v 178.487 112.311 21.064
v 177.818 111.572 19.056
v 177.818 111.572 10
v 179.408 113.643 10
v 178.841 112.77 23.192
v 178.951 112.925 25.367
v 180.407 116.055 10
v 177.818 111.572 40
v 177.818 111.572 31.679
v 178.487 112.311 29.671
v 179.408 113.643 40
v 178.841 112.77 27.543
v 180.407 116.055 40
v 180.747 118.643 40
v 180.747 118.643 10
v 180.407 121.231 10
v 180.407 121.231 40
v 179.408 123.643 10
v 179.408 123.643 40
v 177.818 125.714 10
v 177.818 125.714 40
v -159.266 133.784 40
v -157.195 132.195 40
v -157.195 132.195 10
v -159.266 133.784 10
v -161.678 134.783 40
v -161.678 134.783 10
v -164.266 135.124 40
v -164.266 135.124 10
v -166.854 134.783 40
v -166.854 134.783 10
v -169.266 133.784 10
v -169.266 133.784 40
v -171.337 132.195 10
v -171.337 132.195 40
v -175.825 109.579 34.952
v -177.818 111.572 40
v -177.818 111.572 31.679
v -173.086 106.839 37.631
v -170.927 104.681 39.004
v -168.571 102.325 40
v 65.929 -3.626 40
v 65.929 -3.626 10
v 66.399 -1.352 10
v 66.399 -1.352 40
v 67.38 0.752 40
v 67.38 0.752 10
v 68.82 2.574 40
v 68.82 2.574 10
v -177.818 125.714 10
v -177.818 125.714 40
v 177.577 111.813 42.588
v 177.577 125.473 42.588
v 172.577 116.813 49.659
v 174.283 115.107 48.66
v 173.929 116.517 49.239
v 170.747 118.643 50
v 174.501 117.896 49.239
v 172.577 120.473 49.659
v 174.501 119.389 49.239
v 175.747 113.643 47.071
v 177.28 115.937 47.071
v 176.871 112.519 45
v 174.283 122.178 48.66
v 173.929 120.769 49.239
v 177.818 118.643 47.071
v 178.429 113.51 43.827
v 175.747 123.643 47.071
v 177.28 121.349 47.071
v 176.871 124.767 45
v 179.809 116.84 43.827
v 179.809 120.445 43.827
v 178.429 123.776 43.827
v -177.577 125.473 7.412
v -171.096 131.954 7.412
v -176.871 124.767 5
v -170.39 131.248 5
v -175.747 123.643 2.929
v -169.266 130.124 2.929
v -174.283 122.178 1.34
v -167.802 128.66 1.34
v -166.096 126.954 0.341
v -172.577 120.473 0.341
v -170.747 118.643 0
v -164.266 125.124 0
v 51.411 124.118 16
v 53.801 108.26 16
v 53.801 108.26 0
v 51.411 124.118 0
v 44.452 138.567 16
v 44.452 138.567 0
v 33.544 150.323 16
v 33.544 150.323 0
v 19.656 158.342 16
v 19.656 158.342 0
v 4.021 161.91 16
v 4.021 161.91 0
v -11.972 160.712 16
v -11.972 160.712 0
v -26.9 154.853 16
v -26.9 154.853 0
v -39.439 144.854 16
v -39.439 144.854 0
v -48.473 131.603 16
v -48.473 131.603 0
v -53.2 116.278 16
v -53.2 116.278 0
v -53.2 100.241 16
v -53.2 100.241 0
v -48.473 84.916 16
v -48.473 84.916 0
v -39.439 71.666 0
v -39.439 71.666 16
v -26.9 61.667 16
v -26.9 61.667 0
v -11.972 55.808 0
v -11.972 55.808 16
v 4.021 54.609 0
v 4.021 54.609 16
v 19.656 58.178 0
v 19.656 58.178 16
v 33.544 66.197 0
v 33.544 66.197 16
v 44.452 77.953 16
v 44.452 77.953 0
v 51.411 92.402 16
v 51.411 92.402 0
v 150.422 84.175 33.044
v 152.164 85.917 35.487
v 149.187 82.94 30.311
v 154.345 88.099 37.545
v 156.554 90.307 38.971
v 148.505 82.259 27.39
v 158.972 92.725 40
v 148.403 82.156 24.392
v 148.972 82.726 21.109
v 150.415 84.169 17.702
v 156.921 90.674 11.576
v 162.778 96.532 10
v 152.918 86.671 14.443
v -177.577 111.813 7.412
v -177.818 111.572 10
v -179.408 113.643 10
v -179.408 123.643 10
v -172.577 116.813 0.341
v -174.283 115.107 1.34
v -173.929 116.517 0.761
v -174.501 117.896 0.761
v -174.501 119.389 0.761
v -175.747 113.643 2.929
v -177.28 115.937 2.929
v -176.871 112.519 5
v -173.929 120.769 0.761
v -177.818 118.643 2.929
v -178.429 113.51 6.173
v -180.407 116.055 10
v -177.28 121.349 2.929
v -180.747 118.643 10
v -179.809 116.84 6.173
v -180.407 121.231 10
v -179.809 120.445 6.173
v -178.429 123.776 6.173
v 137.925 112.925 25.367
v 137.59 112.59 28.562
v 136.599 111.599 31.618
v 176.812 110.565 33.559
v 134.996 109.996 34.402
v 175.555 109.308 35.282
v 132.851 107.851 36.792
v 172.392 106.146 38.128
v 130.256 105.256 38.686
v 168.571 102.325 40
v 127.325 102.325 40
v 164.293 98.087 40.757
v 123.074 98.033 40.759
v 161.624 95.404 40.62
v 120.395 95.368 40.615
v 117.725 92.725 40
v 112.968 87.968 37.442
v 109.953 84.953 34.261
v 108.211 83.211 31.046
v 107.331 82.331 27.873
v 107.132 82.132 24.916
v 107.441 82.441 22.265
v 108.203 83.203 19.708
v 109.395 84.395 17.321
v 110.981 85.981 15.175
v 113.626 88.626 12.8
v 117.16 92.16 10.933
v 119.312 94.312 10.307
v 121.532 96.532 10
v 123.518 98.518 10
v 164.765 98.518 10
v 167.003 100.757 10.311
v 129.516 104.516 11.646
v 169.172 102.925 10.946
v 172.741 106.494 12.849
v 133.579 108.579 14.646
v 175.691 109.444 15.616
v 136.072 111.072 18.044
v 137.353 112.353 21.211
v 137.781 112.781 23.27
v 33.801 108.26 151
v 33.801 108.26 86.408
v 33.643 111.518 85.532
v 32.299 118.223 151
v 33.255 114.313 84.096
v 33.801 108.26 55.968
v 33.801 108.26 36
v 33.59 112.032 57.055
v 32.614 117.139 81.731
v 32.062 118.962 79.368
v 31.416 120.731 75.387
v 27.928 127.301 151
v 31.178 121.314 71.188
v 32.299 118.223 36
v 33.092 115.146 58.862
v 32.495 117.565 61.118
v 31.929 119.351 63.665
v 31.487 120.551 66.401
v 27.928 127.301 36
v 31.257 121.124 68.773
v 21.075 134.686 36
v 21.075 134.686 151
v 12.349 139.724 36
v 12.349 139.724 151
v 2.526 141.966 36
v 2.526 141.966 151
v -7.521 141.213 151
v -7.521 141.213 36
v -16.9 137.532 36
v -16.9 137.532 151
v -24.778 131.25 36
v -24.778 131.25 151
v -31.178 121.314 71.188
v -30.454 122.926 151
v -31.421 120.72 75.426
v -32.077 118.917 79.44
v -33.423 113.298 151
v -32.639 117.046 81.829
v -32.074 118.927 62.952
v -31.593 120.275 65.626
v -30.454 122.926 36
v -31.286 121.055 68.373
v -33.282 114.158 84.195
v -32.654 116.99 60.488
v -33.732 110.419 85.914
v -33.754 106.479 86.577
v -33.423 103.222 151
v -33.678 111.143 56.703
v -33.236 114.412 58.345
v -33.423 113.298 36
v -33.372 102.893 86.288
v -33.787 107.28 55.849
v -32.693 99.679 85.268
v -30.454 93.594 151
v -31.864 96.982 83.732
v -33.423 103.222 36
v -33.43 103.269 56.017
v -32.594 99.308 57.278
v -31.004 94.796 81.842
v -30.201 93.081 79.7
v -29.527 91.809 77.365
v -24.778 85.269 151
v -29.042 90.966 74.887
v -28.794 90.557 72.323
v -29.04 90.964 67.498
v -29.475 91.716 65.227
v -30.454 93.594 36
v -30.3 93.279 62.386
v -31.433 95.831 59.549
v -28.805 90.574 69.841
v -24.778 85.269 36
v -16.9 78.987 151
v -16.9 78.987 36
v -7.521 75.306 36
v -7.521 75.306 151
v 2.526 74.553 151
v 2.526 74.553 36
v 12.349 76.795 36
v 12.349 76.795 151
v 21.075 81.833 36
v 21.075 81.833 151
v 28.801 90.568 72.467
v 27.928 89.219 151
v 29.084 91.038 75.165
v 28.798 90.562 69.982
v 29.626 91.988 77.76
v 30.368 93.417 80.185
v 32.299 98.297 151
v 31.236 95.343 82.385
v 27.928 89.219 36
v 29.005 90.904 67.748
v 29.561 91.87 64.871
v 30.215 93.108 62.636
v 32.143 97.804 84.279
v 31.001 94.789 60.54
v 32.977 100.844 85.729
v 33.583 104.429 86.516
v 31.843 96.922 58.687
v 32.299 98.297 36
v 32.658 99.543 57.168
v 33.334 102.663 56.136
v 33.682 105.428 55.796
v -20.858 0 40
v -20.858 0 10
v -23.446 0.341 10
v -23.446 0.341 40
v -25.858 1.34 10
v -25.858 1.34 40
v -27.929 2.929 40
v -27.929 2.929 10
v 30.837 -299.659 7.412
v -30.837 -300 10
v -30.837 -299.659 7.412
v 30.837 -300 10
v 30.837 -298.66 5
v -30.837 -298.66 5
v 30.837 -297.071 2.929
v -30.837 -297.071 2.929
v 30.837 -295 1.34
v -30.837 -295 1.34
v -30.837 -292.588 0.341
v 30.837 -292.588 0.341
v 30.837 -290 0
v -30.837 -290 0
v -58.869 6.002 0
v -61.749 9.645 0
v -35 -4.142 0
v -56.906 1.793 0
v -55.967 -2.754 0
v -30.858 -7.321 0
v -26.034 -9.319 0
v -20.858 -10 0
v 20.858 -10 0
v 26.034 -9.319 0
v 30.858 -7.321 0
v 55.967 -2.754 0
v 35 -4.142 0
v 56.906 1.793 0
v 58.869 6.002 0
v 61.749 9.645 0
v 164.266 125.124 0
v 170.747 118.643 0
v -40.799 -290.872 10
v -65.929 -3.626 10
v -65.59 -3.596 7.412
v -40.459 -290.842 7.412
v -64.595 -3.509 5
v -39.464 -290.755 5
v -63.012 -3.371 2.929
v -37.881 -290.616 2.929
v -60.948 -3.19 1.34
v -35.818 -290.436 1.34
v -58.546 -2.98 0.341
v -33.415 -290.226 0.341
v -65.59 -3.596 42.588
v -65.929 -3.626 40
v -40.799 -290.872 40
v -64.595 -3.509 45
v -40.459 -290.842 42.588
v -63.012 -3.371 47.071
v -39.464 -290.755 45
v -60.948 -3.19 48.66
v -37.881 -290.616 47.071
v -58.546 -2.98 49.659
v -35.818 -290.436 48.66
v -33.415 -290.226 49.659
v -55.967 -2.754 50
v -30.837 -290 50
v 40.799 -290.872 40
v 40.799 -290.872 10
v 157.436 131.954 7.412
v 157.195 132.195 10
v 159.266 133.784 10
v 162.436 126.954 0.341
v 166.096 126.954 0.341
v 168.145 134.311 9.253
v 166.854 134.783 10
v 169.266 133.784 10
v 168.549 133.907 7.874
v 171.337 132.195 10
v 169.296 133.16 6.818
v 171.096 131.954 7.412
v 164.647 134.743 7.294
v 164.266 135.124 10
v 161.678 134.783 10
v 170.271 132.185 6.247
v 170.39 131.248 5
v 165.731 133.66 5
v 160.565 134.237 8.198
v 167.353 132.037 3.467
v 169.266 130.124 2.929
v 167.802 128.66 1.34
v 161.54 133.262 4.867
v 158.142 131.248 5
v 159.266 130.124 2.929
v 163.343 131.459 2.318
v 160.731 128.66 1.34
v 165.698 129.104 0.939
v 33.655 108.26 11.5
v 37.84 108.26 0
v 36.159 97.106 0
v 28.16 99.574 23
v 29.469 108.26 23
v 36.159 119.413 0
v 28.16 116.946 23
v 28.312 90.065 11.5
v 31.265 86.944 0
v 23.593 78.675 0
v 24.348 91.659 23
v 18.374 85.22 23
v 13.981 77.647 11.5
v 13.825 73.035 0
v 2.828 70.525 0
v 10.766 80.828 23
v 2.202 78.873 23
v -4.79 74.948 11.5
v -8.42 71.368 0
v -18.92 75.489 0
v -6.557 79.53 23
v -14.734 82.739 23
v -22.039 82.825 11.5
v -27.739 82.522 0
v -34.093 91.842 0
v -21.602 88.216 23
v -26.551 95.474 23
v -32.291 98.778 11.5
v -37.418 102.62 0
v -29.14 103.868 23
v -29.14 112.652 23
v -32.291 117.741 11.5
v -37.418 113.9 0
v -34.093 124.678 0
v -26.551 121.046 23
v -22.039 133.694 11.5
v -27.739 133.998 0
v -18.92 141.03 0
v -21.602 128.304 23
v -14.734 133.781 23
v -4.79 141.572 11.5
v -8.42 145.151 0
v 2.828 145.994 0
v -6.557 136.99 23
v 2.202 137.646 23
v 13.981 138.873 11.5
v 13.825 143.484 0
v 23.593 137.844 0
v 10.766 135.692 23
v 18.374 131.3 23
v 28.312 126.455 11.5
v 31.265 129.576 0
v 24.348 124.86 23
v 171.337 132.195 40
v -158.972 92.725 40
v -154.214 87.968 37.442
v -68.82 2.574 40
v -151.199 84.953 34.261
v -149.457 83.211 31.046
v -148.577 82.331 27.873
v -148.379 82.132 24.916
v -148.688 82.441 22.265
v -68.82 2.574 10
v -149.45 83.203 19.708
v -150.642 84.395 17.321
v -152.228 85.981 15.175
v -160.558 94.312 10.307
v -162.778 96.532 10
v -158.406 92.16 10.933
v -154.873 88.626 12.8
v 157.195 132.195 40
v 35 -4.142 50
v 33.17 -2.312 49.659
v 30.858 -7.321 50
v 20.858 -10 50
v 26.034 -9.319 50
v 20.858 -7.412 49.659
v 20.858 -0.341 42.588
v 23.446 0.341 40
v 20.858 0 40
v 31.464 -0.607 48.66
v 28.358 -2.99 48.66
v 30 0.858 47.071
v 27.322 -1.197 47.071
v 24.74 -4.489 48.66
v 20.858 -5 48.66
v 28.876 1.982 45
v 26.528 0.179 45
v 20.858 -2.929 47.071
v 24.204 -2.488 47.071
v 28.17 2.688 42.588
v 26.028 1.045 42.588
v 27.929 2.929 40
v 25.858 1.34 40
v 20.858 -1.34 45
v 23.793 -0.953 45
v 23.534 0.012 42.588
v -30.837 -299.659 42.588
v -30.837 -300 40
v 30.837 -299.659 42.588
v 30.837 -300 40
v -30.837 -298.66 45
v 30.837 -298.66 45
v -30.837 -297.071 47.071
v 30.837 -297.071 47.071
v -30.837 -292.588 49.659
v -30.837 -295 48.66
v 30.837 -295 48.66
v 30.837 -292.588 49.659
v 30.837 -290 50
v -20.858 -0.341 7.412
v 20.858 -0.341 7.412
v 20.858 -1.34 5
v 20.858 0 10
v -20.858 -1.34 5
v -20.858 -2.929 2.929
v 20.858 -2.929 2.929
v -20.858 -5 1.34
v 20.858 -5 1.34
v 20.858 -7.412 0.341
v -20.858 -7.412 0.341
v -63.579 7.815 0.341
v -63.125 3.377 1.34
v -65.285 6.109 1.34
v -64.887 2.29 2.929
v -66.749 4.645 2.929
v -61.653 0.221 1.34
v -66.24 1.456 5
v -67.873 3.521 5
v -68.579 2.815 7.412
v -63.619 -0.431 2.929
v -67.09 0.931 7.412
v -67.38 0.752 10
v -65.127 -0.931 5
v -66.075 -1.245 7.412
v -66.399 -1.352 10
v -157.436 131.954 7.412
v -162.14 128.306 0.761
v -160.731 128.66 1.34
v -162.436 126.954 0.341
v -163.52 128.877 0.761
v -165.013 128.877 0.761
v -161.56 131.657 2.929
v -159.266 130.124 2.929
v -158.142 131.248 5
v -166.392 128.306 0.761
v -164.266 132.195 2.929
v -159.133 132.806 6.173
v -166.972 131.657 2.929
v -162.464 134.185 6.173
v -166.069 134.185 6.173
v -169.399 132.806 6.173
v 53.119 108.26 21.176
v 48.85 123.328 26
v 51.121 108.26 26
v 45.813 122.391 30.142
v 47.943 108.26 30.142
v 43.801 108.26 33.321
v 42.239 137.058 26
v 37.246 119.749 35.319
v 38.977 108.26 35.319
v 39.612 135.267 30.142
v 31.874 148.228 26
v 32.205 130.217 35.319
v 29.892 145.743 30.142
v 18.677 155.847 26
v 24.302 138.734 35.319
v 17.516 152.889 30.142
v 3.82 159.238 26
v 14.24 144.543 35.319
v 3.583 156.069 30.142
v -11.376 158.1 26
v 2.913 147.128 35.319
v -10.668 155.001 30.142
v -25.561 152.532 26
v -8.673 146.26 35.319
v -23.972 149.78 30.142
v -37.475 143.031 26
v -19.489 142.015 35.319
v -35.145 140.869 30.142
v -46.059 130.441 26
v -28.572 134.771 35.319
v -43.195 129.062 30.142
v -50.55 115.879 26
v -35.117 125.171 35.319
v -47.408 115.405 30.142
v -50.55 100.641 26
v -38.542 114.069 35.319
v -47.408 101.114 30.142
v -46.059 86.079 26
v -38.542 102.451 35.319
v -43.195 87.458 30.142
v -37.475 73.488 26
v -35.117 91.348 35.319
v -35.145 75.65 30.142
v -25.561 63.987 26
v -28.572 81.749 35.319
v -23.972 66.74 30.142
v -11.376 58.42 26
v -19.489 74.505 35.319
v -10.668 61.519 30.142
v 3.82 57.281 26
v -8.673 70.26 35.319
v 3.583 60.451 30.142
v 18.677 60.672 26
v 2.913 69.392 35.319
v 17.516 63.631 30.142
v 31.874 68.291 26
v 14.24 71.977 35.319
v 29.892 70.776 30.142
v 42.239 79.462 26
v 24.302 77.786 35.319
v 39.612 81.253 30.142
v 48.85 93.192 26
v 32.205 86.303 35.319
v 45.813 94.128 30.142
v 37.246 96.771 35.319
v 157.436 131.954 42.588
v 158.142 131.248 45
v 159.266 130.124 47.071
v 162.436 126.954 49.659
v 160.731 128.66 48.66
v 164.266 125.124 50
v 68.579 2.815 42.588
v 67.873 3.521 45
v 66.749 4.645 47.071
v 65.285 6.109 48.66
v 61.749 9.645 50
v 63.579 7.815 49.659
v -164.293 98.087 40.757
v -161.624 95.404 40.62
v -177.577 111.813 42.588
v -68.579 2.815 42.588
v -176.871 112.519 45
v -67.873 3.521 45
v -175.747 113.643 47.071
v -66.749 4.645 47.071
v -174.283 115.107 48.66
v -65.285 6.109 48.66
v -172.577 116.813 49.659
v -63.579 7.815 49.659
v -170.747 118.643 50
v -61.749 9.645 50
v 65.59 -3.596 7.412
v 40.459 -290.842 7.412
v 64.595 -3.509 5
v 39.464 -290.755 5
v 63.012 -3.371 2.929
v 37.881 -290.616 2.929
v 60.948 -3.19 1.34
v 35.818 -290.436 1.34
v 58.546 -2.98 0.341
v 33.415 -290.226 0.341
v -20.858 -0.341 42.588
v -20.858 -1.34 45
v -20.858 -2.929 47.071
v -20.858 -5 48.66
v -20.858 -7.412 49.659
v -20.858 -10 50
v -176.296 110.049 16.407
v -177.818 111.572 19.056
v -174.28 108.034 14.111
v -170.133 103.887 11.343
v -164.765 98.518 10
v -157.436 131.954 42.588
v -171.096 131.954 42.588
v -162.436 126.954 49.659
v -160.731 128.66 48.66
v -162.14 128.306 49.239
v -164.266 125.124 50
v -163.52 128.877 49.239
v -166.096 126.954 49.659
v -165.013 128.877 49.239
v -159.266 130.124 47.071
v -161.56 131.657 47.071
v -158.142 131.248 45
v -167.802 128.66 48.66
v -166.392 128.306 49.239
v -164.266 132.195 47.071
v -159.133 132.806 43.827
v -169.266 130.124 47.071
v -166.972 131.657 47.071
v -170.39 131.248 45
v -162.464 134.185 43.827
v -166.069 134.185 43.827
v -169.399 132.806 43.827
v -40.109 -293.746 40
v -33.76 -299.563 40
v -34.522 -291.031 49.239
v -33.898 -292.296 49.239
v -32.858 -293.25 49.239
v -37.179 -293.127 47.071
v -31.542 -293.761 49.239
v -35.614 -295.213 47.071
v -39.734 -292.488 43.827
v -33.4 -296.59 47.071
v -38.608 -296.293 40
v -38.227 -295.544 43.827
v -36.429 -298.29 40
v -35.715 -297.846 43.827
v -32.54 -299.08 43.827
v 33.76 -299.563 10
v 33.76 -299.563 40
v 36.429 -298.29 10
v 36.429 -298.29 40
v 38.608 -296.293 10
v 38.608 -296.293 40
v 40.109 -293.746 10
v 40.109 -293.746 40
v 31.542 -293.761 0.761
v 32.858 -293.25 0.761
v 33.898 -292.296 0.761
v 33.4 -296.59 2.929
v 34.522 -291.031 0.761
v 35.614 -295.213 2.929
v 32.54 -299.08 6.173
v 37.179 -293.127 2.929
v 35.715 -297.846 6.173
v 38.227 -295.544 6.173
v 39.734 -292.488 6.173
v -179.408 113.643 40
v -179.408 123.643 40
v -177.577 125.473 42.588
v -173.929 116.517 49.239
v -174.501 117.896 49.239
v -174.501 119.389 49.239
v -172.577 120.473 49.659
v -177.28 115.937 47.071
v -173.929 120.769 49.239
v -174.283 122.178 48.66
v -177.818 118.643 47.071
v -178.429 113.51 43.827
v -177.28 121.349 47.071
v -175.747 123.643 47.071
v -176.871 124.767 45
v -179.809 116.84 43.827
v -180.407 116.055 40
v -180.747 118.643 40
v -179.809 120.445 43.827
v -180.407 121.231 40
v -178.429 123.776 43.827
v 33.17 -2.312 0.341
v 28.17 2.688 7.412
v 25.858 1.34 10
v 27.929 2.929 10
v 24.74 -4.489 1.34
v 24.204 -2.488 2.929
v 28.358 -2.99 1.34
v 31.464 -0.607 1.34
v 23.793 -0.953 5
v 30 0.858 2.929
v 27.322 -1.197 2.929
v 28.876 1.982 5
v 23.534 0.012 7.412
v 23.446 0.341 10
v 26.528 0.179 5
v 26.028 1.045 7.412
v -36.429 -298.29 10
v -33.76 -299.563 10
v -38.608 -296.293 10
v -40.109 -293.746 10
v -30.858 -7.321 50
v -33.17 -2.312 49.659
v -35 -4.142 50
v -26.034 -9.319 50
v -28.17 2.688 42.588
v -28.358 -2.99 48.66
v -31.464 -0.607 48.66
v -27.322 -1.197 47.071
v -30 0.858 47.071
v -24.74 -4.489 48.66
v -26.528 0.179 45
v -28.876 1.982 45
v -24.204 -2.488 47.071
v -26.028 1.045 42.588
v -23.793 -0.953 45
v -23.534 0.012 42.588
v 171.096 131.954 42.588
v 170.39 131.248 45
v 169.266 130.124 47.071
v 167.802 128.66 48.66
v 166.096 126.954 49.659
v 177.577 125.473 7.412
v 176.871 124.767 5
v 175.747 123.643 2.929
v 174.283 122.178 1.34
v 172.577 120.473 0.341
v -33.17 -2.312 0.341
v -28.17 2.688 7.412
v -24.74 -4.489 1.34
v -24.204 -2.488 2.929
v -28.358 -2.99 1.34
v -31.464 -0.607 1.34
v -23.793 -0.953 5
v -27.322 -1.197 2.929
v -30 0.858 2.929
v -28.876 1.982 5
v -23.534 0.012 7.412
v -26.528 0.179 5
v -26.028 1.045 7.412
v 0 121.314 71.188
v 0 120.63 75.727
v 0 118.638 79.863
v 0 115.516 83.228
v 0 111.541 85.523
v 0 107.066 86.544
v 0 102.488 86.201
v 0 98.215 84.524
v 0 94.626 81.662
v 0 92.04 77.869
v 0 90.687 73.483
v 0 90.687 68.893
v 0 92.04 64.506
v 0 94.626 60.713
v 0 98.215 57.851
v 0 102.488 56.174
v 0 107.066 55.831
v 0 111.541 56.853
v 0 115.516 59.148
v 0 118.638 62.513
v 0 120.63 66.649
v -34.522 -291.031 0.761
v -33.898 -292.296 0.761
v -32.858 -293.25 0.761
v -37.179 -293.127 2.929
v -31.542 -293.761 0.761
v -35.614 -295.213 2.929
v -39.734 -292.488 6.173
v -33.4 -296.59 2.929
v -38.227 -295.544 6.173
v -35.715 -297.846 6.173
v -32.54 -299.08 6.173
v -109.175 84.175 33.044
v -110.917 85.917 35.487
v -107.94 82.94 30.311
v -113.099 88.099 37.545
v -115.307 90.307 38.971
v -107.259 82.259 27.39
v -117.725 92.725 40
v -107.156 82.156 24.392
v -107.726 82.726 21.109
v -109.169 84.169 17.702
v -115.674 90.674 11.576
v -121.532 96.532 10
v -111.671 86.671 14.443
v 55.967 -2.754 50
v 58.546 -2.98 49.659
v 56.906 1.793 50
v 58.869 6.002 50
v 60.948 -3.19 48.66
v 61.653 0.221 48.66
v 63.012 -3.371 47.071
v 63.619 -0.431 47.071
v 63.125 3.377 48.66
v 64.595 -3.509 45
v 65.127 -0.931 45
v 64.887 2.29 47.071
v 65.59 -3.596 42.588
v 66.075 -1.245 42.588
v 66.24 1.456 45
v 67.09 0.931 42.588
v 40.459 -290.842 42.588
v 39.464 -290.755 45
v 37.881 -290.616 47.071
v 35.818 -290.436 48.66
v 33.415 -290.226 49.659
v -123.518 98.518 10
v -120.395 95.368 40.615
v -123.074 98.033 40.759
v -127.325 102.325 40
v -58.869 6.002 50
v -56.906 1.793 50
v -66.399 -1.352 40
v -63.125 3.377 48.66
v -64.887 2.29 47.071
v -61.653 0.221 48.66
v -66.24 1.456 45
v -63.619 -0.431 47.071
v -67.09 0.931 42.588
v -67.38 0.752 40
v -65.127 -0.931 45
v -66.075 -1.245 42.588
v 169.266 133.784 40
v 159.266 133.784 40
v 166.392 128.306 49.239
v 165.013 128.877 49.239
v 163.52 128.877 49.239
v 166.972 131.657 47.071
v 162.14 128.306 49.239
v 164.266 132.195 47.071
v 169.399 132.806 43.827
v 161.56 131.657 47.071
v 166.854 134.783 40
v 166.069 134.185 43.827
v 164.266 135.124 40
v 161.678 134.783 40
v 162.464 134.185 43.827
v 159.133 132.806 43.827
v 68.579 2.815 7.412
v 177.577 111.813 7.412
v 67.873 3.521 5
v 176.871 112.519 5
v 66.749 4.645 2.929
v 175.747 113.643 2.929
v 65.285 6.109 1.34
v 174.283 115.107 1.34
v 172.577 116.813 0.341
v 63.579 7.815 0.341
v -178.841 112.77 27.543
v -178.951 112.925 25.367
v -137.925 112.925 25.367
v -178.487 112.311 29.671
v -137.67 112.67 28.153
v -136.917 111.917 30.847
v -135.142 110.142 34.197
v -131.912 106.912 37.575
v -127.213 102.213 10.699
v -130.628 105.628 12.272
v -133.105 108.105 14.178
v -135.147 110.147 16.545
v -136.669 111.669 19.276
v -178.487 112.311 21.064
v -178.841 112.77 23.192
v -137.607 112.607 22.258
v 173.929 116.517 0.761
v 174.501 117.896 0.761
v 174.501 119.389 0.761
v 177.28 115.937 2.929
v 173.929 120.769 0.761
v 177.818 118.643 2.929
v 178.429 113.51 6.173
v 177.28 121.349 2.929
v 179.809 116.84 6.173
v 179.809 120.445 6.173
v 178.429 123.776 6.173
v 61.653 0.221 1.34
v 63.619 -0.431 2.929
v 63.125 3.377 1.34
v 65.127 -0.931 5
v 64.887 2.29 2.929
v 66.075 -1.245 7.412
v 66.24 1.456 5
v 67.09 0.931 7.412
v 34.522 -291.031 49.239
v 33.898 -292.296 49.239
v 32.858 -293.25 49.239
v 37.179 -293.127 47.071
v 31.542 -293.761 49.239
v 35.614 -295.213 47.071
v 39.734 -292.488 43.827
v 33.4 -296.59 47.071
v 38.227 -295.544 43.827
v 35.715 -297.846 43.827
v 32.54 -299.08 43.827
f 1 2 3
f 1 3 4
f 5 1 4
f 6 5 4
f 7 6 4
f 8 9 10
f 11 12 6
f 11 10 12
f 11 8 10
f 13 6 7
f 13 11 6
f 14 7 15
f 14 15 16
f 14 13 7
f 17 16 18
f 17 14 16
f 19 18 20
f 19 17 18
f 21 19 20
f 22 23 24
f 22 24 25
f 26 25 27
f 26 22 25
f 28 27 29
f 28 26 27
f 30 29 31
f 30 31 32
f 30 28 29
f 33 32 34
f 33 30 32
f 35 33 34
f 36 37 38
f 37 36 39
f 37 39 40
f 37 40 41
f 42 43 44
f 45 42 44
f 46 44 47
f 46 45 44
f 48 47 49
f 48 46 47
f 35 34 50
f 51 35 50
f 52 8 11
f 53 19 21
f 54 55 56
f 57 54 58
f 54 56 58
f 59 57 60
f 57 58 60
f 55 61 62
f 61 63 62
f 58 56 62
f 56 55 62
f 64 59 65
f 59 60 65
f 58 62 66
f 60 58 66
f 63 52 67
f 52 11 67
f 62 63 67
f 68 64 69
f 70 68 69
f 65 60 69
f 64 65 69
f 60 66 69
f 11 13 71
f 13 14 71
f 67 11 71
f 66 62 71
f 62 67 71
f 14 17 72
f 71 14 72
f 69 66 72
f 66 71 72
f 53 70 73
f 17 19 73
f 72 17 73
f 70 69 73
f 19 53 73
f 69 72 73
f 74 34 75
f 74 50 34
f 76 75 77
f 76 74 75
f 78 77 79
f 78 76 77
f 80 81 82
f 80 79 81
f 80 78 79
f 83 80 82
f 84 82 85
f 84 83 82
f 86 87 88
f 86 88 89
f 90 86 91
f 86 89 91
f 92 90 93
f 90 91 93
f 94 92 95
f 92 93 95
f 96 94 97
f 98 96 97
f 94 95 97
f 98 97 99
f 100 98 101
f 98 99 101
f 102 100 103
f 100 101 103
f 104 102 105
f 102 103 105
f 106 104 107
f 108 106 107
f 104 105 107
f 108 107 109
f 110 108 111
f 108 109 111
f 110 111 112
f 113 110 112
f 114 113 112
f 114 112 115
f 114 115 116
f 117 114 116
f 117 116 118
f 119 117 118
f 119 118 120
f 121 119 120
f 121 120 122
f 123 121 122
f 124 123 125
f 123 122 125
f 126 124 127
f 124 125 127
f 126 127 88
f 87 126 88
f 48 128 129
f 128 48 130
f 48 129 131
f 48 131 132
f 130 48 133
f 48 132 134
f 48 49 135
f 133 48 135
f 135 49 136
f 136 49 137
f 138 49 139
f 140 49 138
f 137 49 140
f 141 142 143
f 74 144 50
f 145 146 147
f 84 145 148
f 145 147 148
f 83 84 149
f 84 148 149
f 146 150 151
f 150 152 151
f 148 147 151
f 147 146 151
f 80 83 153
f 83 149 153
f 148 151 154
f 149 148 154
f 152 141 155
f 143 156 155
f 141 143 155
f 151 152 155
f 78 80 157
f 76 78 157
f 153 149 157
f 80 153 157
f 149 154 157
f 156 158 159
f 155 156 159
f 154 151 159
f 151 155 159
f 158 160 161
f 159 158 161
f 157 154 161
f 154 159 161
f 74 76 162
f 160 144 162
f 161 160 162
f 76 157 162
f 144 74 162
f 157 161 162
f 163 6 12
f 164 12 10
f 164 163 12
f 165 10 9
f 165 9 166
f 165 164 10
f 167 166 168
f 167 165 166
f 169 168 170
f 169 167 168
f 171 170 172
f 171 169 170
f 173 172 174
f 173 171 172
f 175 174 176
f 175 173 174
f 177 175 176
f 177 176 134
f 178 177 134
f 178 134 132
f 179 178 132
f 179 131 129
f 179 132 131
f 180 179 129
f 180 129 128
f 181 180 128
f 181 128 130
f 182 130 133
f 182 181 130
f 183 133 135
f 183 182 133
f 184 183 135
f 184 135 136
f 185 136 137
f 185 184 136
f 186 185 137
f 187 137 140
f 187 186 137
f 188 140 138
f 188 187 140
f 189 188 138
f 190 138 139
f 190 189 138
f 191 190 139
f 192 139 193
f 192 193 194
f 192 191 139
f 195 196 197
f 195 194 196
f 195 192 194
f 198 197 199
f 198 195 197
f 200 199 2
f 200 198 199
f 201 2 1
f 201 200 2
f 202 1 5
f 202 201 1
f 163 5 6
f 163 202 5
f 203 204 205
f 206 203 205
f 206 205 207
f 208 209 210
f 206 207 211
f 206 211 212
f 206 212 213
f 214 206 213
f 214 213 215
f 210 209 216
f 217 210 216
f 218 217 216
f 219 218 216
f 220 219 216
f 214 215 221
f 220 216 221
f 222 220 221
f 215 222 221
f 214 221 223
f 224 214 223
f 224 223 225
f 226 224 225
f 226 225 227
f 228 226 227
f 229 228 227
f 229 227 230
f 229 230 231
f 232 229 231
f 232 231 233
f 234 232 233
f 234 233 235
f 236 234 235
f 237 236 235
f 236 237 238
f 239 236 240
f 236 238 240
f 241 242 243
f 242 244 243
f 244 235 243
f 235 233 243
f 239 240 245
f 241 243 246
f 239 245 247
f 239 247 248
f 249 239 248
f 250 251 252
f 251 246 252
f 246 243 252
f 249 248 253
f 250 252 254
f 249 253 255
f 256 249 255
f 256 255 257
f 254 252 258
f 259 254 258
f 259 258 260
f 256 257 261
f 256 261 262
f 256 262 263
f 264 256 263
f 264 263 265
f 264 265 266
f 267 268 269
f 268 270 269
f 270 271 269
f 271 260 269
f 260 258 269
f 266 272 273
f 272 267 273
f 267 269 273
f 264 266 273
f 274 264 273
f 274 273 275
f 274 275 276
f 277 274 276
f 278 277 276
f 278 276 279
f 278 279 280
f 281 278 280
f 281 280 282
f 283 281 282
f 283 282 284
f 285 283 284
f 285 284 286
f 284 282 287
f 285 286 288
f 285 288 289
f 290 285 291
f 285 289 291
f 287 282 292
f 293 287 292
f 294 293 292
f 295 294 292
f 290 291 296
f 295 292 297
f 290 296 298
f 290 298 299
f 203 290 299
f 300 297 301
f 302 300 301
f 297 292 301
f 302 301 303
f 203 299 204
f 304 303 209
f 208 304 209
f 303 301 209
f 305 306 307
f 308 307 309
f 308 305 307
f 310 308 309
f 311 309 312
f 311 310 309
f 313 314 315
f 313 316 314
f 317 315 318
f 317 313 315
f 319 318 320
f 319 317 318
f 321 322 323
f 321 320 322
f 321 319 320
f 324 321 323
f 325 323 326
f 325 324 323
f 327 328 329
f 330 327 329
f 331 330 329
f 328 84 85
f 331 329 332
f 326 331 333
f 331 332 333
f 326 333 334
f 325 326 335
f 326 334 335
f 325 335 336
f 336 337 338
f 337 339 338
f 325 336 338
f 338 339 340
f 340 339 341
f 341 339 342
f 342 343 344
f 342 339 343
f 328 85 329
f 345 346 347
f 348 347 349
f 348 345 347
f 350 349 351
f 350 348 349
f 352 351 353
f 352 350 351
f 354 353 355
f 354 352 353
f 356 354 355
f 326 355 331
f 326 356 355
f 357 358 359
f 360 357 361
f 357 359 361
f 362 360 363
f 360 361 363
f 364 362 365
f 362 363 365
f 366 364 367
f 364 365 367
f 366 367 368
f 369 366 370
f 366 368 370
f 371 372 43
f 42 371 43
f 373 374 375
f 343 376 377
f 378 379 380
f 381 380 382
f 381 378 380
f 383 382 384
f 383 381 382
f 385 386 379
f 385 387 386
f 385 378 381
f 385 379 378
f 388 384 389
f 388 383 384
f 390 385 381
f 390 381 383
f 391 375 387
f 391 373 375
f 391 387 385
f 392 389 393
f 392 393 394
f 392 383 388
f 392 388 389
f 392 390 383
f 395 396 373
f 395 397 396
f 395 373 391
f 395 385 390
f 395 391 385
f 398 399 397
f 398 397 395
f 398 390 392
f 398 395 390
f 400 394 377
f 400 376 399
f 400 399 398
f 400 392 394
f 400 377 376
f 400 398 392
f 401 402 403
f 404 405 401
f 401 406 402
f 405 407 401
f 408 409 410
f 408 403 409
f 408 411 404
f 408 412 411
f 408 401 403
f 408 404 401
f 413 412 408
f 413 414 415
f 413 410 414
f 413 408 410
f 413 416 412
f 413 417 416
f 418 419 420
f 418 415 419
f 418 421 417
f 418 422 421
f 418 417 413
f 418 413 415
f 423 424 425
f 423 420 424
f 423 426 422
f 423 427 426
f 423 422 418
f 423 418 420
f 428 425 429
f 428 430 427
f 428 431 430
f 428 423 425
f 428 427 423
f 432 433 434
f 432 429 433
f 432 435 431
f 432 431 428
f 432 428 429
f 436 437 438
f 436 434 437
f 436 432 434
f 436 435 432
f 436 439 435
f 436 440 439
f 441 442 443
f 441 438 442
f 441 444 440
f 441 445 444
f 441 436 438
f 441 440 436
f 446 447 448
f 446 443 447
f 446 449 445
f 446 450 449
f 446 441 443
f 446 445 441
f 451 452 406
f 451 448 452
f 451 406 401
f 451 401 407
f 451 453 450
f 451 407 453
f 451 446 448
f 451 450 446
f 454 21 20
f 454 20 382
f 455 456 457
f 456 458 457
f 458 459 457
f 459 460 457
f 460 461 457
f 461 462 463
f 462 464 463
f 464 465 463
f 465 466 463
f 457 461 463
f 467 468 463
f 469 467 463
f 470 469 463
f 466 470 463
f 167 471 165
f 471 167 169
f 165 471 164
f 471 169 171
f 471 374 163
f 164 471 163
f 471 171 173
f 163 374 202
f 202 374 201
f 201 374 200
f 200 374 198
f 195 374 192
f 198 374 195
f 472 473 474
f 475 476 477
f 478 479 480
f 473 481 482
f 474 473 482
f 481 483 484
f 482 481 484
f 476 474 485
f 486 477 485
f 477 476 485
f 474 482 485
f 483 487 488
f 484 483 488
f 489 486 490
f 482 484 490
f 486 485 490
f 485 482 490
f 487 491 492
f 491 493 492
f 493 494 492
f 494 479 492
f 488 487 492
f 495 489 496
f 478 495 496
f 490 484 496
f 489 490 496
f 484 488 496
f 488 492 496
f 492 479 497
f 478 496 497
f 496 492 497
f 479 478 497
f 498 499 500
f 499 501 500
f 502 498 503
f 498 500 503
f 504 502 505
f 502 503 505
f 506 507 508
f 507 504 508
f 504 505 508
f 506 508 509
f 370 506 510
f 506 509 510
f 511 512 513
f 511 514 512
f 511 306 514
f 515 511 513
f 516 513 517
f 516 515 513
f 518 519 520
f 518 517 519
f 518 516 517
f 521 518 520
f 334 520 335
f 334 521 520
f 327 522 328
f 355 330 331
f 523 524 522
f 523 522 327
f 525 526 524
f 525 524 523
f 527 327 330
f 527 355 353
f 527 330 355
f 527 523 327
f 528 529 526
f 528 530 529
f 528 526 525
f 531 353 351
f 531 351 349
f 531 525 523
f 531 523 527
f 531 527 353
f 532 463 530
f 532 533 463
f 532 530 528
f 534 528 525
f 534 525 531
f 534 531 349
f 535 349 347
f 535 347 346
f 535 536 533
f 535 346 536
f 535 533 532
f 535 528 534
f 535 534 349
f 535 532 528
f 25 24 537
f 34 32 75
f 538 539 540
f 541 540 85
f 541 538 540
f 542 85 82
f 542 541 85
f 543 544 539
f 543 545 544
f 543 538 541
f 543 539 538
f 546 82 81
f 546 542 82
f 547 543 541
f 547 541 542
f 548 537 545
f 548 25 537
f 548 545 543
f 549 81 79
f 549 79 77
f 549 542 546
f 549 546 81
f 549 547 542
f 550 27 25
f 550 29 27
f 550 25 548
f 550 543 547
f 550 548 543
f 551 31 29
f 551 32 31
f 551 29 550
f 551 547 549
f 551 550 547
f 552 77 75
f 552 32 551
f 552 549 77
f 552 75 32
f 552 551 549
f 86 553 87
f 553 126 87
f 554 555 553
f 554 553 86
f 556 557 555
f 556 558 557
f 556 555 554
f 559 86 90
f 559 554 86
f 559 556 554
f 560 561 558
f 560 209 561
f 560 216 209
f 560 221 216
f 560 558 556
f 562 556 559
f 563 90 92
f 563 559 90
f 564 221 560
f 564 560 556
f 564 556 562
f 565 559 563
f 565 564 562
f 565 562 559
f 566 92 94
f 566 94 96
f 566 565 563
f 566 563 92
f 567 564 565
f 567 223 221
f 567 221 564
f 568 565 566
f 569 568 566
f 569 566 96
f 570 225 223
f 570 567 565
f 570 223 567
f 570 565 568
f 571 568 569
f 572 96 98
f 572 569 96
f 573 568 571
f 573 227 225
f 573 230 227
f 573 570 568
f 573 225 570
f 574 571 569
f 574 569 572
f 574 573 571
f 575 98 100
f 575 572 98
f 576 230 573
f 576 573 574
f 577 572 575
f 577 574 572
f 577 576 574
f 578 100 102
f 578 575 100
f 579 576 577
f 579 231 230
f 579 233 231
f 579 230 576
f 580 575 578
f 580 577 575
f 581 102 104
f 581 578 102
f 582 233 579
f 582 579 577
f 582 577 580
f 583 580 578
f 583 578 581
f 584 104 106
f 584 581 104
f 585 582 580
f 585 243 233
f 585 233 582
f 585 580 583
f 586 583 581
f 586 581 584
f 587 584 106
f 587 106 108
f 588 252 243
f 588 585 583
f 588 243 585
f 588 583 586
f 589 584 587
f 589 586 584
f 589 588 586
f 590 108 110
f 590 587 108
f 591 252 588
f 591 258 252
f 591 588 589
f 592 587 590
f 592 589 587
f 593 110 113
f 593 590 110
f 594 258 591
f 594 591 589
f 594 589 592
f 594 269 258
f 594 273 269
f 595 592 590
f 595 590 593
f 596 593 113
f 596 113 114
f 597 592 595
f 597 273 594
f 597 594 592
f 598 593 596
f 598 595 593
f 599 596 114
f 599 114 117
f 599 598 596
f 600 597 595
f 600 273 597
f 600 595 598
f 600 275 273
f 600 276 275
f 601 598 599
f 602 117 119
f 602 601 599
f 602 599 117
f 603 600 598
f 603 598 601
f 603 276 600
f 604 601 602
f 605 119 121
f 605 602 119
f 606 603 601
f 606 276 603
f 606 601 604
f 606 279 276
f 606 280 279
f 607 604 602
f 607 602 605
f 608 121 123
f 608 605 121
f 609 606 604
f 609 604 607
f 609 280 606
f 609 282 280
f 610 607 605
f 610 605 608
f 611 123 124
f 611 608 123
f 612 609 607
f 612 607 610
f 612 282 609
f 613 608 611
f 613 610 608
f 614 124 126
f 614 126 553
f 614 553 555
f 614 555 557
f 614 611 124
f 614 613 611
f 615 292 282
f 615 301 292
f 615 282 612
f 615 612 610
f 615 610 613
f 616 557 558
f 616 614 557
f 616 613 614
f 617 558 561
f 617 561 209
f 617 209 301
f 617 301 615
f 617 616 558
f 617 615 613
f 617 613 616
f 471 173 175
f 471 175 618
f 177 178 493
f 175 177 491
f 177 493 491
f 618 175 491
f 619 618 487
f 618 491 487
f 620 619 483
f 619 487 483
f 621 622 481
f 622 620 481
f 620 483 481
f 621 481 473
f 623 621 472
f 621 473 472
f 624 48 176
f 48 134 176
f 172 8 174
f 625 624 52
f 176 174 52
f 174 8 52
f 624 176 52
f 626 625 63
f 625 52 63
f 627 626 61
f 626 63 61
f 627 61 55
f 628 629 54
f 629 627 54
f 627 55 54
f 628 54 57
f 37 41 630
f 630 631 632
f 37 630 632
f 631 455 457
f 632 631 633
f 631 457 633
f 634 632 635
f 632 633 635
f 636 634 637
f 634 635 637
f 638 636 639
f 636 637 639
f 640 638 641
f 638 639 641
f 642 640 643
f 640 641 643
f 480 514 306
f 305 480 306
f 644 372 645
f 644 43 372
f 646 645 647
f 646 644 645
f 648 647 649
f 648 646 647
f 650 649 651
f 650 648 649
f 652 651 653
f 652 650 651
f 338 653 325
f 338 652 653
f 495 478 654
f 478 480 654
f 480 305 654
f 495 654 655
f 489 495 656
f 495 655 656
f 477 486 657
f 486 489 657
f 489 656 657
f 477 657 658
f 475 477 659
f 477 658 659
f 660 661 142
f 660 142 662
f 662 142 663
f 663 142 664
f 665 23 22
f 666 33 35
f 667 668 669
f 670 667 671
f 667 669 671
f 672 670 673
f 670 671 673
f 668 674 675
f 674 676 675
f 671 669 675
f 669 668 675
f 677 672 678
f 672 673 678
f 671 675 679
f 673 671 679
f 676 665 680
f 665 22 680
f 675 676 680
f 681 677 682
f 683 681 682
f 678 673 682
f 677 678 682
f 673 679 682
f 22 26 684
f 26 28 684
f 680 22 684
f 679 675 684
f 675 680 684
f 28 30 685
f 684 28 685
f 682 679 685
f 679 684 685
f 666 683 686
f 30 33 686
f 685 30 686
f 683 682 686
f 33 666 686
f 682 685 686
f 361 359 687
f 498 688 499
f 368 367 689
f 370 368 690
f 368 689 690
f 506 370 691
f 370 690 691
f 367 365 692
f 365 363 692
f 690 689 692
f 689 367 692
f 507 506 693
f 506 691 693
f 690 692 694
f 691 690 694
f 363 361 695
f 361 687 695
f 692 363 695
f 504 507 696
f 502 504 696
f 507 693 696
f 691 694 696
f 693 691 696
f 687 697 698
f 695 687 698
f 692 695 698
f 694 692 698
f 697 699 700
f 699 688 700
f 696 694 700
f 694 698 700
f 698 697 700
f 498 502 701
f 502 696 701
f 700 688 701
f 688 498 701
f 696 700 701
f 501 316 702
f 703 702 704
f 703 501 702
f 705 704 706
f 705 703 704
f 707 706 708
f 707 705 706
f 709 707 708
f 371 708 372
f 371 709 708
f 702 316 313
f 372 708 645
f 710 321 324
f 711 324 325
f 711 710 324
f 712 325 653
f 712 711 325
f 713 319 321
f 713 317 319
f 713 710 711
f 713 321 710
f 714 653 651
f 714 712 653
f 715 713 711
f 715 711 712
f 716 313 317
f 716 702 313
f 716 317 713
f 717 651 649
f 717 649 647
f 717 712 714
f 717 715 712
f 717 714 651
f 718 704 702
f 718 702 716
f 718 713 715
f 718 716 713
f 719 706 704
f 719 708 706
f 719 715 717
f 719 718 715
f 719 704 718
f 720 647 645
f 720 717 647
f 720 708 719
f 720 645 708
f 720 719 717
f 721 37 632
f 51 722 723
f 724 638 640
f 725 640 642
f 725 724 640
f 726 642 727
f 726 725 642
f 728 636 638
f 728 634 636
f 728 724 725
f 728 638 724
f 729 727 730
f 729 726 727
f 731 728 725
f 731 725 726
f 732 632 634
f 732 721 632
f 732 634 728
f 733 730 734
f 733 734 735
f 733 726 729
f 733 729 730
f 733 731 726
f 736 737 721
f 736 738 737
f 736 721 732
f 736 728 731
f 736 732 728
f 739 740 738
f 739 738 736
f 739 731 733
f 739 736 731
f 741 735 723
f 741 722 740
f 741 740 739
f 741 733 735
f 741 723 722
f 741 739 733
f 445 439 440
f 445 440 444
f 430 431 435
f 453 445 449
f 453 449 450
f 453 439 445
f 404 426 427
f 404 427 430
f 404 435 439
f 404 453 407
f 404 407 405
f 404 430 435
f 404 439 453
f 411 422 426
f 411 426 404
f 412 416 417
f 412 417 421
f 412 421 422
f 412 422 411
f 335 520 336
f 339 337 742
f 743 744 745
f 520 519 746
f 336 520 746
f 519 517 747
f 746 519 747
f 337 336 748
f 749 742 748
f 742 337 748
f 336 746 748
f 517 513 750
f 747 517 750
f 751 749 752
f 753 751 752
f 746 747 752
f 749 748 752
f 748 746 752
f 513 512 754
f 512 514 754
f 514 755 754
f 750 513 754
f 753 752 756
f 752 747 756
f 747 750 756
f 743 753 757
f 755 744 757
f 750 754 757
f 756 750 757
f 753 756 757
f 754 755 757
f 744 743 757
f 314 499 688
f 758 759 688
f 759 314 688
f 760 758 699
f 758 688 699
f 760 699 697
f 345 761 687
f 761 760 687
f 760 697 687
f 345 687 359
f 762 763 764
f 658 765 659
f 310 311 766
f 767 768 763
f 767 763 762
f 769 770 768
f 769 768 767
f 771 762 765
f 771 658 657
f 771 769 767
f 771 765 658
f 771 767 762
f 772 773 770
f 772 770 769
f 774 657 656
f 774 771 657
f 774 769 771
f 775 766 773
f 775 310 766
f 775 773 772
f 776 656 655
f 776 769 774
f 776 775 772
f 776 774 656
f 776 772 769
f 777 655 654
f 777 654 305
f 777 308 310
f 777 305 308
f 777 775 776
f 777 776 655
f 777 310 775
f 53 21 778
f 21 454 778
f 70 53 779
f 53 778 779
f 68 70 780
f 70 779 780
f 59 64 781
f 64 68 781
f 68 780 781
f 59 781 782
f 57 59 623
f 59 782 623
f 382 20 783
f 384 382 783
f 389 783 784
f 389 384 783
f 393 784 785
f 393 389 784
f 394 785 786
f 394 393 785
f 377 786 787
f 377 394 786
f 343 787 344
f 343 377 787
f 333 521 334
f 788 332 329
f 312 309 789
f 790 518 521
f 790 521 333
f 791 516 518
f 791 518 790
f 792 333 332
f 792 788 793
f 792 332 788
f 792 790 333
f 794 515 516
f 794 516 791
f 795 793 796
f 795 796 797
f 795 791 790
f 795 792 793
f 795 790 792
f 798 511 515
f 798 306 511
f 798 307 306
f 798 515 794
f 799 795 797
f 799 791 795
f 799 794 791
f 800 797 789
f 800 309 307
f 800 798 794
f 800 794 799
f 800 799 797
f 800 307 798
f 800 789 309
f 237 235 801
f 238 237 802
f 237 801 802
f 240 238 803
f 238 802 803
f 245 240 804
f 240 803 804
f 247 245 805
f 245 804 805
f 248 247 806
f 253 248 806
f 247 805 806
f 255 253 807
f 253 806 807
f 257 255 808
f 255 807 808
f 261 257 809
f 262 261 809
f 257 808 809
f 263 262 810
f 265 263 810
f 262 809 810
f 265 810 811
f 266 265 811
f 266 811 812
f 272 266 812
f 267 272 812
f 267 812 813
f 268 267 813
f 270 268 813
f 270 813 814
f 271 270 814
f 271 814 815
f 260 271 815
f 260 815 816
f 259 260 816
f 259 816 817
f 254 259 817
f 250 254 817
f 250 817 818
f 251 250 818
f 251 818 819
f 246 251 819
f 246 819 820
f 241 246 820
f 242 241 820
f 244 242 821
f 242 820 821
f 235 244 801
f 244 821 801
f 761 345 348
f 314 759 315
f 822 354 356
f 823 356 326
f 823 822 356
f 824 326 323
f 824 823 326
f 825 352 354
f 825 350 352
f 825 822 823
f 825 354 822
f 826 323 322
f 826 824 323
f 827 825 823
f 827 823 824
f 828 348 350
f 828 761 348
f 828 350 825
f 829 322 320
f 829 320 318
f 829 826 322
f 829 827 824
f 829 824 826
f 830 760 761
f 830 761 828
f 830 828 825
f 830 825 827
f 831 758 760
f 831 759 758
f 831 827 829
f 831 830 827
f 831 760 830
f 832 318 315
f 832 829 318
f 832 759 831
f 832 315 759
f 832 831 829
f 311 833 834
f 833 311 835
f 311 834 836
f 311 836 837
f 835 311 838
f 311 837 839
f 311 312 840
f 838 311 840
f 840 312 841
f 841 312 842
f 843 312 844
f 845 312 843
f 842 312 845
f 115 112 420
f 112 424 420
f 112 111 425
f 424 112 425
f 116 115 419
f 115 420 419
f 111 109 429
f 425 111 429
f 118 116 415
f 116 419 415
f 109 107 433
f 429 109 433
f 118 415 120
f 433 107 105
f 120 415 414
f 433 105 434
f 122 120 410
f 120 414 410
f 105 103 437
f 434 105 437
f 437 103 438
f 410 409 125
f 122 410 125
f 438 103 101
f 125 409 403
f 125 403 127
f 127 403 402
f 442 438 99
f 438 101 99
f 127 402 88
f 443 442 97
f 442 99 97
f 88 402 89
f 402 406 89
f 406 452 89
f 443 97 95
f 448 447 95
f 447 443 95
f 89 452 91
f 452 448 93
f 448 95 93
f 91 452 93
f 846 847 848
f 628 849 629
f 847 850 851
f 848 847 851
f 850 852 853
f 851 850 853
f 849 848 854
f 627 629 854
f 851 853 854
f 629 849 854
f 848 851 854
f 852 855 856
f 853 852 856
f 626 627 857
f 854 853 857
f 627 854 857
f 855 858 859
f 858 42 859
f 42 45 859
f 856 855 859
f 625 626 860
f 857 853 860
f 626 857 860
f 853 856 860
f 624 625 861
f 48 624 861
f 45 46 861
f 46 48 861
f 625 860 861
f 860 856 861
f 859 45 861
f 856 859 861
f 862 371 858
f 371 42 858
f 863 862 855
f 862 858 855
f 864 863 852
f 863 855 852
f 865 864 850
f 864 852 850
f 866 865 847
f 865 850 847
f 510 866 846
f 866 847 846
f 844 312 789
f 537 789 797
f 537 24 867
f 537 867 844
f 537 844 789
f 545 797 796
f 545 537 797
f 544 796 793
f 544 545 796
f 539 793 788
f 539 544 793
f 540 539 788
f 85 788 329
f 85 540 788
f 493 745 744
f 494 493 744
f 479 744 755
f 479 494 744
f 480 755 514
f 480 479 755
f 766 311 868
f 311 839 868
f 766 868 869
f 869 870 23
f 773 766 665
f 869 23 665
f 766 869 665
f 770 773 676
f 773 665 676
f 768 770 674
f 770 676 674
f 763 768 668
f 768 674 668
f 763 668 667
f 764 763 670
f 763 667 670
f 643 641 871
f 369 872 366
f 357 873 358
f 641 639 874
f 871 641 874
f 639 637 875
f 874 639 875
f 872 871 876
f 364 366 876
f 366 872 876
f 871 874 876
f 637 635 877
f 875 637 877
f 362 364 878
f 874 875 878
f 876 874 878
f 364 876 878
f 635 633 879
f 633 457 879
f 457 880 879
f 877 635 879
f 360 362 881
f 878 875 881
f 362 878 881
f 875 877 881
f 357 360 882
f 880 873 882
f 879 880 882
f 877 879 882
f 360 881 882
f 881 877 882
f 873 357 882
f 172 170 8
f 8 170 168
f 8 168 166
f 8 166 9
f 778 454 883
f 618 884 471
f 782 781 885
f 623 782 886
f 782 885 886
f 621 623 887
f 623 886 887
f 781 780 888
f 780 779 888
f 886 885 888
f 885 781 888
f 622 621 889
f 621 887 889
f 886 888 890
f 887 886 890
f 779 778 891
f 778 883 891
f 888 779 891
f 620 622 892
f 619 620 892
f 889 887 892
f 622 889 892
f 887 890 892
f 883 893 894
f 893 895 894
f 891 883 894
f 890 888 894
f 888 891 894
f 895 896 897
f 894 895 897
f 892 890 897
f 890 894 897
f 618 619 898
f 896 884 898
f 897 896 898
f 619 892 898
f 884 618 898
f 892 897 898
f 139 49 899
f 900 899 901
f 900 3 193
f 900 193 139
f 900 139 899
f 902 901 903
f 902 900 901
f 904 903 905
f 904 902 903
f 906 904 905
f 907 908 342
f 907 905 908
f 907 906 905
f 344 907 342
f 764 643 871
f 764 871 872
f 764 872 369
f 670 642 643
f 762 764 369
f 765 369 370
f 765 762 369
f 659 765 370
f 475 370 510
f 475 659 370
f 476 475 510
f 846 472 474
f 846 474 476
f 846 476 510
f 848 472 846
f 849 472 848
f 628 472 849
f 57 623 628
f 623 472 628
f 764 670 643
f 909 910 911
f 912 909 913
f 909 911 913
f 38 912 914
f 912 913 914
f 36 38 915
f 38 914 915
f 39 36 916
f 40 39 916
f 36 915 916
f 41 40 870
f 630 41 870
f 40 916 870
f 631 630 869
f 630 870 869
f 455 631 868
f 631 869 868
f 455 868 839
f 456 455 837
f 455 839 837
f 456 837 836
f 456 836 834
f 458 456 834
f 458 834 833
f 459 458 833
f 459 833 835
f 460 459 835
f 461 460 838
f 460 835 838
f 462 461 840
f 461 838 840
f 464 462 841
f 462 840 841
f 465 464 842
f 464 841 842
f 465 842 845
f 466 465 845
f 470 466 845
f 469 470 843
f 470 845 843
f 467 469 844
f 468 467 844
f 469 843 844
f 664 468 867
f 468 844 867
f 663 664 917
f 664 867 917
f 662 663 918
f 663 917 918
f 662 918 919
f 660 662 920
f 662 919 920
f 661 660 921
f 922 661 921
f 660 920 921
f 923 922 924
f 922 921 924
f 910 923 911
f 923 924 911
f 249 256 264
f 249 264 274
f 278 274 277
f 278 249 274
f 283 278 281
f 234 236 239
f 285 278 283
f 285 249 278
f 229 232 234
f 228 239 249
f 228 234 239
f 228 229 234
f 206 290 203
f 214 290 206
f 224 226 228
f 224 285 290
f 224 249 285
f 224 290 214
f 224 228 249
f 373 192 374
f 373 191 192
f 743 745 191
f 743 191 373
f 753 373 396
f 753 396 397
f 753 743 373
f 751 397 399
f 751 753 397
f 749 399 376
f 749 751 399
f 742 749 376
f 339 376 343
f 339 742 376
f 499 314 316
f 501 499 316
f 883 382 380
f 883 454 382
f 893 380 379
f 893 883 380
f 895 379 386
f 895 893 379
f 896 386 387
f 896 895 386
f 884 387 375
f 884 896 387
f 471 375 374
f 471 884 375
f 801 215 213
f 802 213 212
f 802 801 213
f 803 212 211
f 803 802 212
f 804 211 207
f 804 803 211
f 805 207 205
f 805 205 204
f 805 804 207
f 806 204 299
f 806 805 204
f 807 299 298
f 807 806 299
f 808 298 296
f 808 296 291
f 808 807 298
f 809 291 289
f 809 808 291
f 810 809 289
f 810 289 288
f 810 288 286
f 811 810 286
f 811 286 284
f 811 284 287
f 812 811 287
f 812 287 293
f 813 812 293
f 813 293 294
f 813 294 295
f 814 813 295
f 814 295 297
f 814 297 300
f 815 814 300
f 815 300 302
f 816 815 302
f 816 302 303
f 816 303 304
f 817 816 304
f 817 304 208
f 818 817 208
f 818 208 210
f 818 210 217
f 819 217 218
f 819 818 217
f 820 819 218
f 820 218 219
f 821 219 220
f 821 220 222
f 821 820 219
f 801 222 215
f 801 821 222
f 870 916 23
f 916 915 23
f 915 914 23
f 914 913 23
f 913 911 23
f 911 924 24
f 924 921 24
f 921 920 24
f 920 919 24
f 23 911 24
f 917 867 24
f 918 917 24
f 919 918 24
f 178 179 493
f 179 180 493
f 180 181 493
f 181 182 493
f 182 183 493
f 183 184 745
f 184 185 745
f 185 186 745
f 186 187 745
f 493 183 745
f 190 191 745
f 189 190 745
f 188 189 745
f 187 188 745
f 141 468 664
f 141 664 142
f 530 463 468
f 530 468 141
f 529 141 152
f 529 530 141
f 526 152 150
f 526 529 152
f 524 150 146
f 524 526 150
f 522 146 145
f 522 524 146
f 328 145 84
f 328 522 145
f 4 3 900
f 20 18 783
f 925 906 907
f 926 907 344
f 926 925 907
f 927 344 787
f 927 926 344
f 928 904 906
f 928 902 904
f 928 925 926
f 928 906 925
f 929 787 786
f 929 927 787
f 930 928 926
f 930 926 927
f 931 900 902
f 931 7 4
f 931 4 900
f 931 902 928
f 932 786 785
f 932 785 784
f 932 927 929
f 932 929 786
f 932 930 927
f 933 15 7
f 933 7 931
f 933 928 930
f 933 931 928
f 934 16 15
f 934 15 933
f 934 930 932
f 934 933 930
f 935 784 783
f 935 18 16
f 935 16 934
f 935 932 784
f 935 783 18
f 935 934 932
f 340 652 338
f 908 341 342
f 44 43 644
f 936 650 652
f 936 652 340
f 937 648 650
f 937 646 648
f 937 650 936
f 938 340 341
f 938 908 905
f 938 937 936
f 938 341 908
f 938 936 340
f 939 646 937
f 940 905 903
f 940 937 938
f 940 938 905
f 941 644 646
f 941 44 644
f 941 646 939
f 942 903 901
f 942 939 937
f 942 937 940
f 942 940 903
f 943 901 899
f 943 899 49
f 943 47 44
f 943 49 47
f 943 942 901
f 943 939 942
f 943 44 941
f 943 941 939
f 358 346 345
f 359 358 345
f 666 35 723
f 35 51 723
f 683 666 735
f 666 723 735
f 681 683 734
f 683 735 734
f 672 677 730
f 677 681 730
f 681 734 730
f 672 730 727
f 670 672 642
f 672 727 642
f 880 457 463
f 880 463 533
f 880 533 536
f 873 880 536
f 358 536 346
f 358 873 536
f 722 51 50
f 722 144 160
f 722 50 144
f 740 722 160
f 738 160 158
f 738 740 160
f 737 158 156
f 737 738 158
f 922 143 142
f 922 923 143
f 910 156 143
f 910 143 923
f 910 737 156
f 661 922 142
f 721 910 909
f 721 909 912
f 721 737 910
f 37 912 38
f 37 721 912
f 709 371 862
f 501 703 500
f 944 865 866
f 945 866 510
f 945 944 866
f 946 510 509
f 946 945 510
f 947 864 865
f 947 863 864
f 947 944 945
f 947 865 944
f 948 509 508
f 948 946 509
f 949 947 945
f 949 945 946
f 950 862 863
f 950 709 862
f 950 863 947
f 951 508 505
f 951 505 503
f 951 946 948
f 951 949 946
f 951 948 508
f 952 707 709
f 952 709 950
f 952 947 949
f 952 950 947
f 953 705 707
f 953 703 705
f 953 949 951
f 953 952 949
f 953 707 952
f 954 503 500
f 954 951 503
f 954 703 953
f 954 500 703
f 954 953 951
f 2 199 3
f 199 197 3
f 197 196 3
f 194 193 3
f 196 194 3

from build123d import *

# Parameters (mm, degrees)
F1_DEPTH       = 50
F2_R           = 10
F3_R           = 15.3995531455
F4_DEPTH       = 242.7
F4_DEPTH_BACK  = 187
F5_R           = 53.8009172273
F6_DEPTH       = 36
F7_R           = 20
F8_DEPTH       = 115
F9_R           = 15.399555
F10_DEPTH      = 82
F10_DEPTH_BACK = 108
F11_R          = 37.8401838669
F12_DEPTH      = 23
F12_TAPER      = 20


with BuildPart() as f1:
    # F0 (on Top) → F1 (new body)
    with BuildSketch(Plane.XY):
        Polygon((-40, -300), (0, -300), (40, -300), (66.2465990578, 0), (184.8894452647, 118.642846207), (164.2661457358, 139.2661457358), (25, 0), (0, 0), (-25, 0), (-164.2661457358, 139.2661457358), (-184.8894452647, 118.642846207), (-66.2465990578, 0), align=None)
    extrude(amount=F1_DEPTH)

    # F2
    f2_edges = [f1.edges().sort_by_distance(p)[0] for p in [
        (-184.889445, 118.642846, 25),
        (-66.246599, 0, 25),
        (-125.568022, 59.321423, 0),
        (-125.568022, 59.321423, 50),
        (-40, -300, 25),
        (-53.1233, -150, 0),
        (-53.1233, -150, 50),
        (0, -300, 50),
        (40, -300, 25),
        (0, -300, 0),
        (66.246599, 0, 25),
        (53.1233, -150, 0),
        (53.1233, -150, 50),
        (184.889445, 118.642846, 25),
        (125.568022, 59.321423, 0),
        (125.568022, 59.321423, 50),
        (94.633073, 69.633073, 0),
        (164.266146, 139.266146, 25),
        (174.577796, 128.954496, 0),
        (174.577796, 128.954496, 50),
        (25, 0, 25),
        (94.633073, 69.633073, 50),
        (0, 0, 50),
        (-25, 0, 25),
        (0, 0, 0),
        (-164.266146, 139.266146, 25),
        (-94.633073, 69.633073, 0),
        (-94.633073, 69.633073, 50),
        (-174.577796, 128.954496, 0),
        (-174.577796, 128.954496, 50),
    ]]
    fillet(f2_edges, radius=F2_R)

    # F3 (on Right) → F4 (cut, two sides)
    with BuildSketch(Plane.YZ) as f4_sk:
        with Locations((97.5249931216, 25.3674779087)):
            Circle(F3_R)
    extrude(amount=-F4_DEPTH, mode=Mode.SUBTRACT)
    extrude(f4_sk.sketch, amount=F4_DEPTH_BACK, mode=Mode.SUBTRACT)


with BuildPart() as f6:
    # F5 (on Top) → F6 (new body)
    with BuildSketch(Plane.XY):
        with Locations((0, 108.2598343492)):
            Circle(F5_R)
    extrude(amount=F6_DEPTH)

    # F7
    f7_edges = [f6.edges().sort_by_distance(p)[0] for p in [
        (-53.800917, 108.259834, 36),
    ]]
    fillet(f7_edges, radius=F7_R)

    # F8 (add): a face of the model
    f8_faces = [f6.faces().sort_by_distance(p)[0] for p in [
        (0, 108.2598343492, 36),
    ]]
    extrude(f8_faces, amount=F8_DEPTH)

    # F9 (on Right) → F10 (cut, two sides)
    with BuildSketch(Plane.YZ) as f10_sk:
        with Locations((105.9147268534, 71.1878240108)):
            Circle(F9_R)
    extrude(amount=-F10_DEPTH, mode=Mode.SUBTRACT)
    extrude(f10_sk.sketch, amount=F10_DEPTH_BACK, mode=Mode.SUBTRACT)

    # F11 (on face) → F12 (cut)
    with BuildSketch(Plane(origin=(0, 0, 0), x_dir=(1, 0, 0), z_dir=(0, 0, -1))):
        with Locations((0, -108.2598343492)):
            Circle(F11_R)
    extrude(amount=-F12_DEPTH, taper=F12_TAPER, mode=Mode.SUBTRACT)


solid = Compound([f1.part, f6.part])
